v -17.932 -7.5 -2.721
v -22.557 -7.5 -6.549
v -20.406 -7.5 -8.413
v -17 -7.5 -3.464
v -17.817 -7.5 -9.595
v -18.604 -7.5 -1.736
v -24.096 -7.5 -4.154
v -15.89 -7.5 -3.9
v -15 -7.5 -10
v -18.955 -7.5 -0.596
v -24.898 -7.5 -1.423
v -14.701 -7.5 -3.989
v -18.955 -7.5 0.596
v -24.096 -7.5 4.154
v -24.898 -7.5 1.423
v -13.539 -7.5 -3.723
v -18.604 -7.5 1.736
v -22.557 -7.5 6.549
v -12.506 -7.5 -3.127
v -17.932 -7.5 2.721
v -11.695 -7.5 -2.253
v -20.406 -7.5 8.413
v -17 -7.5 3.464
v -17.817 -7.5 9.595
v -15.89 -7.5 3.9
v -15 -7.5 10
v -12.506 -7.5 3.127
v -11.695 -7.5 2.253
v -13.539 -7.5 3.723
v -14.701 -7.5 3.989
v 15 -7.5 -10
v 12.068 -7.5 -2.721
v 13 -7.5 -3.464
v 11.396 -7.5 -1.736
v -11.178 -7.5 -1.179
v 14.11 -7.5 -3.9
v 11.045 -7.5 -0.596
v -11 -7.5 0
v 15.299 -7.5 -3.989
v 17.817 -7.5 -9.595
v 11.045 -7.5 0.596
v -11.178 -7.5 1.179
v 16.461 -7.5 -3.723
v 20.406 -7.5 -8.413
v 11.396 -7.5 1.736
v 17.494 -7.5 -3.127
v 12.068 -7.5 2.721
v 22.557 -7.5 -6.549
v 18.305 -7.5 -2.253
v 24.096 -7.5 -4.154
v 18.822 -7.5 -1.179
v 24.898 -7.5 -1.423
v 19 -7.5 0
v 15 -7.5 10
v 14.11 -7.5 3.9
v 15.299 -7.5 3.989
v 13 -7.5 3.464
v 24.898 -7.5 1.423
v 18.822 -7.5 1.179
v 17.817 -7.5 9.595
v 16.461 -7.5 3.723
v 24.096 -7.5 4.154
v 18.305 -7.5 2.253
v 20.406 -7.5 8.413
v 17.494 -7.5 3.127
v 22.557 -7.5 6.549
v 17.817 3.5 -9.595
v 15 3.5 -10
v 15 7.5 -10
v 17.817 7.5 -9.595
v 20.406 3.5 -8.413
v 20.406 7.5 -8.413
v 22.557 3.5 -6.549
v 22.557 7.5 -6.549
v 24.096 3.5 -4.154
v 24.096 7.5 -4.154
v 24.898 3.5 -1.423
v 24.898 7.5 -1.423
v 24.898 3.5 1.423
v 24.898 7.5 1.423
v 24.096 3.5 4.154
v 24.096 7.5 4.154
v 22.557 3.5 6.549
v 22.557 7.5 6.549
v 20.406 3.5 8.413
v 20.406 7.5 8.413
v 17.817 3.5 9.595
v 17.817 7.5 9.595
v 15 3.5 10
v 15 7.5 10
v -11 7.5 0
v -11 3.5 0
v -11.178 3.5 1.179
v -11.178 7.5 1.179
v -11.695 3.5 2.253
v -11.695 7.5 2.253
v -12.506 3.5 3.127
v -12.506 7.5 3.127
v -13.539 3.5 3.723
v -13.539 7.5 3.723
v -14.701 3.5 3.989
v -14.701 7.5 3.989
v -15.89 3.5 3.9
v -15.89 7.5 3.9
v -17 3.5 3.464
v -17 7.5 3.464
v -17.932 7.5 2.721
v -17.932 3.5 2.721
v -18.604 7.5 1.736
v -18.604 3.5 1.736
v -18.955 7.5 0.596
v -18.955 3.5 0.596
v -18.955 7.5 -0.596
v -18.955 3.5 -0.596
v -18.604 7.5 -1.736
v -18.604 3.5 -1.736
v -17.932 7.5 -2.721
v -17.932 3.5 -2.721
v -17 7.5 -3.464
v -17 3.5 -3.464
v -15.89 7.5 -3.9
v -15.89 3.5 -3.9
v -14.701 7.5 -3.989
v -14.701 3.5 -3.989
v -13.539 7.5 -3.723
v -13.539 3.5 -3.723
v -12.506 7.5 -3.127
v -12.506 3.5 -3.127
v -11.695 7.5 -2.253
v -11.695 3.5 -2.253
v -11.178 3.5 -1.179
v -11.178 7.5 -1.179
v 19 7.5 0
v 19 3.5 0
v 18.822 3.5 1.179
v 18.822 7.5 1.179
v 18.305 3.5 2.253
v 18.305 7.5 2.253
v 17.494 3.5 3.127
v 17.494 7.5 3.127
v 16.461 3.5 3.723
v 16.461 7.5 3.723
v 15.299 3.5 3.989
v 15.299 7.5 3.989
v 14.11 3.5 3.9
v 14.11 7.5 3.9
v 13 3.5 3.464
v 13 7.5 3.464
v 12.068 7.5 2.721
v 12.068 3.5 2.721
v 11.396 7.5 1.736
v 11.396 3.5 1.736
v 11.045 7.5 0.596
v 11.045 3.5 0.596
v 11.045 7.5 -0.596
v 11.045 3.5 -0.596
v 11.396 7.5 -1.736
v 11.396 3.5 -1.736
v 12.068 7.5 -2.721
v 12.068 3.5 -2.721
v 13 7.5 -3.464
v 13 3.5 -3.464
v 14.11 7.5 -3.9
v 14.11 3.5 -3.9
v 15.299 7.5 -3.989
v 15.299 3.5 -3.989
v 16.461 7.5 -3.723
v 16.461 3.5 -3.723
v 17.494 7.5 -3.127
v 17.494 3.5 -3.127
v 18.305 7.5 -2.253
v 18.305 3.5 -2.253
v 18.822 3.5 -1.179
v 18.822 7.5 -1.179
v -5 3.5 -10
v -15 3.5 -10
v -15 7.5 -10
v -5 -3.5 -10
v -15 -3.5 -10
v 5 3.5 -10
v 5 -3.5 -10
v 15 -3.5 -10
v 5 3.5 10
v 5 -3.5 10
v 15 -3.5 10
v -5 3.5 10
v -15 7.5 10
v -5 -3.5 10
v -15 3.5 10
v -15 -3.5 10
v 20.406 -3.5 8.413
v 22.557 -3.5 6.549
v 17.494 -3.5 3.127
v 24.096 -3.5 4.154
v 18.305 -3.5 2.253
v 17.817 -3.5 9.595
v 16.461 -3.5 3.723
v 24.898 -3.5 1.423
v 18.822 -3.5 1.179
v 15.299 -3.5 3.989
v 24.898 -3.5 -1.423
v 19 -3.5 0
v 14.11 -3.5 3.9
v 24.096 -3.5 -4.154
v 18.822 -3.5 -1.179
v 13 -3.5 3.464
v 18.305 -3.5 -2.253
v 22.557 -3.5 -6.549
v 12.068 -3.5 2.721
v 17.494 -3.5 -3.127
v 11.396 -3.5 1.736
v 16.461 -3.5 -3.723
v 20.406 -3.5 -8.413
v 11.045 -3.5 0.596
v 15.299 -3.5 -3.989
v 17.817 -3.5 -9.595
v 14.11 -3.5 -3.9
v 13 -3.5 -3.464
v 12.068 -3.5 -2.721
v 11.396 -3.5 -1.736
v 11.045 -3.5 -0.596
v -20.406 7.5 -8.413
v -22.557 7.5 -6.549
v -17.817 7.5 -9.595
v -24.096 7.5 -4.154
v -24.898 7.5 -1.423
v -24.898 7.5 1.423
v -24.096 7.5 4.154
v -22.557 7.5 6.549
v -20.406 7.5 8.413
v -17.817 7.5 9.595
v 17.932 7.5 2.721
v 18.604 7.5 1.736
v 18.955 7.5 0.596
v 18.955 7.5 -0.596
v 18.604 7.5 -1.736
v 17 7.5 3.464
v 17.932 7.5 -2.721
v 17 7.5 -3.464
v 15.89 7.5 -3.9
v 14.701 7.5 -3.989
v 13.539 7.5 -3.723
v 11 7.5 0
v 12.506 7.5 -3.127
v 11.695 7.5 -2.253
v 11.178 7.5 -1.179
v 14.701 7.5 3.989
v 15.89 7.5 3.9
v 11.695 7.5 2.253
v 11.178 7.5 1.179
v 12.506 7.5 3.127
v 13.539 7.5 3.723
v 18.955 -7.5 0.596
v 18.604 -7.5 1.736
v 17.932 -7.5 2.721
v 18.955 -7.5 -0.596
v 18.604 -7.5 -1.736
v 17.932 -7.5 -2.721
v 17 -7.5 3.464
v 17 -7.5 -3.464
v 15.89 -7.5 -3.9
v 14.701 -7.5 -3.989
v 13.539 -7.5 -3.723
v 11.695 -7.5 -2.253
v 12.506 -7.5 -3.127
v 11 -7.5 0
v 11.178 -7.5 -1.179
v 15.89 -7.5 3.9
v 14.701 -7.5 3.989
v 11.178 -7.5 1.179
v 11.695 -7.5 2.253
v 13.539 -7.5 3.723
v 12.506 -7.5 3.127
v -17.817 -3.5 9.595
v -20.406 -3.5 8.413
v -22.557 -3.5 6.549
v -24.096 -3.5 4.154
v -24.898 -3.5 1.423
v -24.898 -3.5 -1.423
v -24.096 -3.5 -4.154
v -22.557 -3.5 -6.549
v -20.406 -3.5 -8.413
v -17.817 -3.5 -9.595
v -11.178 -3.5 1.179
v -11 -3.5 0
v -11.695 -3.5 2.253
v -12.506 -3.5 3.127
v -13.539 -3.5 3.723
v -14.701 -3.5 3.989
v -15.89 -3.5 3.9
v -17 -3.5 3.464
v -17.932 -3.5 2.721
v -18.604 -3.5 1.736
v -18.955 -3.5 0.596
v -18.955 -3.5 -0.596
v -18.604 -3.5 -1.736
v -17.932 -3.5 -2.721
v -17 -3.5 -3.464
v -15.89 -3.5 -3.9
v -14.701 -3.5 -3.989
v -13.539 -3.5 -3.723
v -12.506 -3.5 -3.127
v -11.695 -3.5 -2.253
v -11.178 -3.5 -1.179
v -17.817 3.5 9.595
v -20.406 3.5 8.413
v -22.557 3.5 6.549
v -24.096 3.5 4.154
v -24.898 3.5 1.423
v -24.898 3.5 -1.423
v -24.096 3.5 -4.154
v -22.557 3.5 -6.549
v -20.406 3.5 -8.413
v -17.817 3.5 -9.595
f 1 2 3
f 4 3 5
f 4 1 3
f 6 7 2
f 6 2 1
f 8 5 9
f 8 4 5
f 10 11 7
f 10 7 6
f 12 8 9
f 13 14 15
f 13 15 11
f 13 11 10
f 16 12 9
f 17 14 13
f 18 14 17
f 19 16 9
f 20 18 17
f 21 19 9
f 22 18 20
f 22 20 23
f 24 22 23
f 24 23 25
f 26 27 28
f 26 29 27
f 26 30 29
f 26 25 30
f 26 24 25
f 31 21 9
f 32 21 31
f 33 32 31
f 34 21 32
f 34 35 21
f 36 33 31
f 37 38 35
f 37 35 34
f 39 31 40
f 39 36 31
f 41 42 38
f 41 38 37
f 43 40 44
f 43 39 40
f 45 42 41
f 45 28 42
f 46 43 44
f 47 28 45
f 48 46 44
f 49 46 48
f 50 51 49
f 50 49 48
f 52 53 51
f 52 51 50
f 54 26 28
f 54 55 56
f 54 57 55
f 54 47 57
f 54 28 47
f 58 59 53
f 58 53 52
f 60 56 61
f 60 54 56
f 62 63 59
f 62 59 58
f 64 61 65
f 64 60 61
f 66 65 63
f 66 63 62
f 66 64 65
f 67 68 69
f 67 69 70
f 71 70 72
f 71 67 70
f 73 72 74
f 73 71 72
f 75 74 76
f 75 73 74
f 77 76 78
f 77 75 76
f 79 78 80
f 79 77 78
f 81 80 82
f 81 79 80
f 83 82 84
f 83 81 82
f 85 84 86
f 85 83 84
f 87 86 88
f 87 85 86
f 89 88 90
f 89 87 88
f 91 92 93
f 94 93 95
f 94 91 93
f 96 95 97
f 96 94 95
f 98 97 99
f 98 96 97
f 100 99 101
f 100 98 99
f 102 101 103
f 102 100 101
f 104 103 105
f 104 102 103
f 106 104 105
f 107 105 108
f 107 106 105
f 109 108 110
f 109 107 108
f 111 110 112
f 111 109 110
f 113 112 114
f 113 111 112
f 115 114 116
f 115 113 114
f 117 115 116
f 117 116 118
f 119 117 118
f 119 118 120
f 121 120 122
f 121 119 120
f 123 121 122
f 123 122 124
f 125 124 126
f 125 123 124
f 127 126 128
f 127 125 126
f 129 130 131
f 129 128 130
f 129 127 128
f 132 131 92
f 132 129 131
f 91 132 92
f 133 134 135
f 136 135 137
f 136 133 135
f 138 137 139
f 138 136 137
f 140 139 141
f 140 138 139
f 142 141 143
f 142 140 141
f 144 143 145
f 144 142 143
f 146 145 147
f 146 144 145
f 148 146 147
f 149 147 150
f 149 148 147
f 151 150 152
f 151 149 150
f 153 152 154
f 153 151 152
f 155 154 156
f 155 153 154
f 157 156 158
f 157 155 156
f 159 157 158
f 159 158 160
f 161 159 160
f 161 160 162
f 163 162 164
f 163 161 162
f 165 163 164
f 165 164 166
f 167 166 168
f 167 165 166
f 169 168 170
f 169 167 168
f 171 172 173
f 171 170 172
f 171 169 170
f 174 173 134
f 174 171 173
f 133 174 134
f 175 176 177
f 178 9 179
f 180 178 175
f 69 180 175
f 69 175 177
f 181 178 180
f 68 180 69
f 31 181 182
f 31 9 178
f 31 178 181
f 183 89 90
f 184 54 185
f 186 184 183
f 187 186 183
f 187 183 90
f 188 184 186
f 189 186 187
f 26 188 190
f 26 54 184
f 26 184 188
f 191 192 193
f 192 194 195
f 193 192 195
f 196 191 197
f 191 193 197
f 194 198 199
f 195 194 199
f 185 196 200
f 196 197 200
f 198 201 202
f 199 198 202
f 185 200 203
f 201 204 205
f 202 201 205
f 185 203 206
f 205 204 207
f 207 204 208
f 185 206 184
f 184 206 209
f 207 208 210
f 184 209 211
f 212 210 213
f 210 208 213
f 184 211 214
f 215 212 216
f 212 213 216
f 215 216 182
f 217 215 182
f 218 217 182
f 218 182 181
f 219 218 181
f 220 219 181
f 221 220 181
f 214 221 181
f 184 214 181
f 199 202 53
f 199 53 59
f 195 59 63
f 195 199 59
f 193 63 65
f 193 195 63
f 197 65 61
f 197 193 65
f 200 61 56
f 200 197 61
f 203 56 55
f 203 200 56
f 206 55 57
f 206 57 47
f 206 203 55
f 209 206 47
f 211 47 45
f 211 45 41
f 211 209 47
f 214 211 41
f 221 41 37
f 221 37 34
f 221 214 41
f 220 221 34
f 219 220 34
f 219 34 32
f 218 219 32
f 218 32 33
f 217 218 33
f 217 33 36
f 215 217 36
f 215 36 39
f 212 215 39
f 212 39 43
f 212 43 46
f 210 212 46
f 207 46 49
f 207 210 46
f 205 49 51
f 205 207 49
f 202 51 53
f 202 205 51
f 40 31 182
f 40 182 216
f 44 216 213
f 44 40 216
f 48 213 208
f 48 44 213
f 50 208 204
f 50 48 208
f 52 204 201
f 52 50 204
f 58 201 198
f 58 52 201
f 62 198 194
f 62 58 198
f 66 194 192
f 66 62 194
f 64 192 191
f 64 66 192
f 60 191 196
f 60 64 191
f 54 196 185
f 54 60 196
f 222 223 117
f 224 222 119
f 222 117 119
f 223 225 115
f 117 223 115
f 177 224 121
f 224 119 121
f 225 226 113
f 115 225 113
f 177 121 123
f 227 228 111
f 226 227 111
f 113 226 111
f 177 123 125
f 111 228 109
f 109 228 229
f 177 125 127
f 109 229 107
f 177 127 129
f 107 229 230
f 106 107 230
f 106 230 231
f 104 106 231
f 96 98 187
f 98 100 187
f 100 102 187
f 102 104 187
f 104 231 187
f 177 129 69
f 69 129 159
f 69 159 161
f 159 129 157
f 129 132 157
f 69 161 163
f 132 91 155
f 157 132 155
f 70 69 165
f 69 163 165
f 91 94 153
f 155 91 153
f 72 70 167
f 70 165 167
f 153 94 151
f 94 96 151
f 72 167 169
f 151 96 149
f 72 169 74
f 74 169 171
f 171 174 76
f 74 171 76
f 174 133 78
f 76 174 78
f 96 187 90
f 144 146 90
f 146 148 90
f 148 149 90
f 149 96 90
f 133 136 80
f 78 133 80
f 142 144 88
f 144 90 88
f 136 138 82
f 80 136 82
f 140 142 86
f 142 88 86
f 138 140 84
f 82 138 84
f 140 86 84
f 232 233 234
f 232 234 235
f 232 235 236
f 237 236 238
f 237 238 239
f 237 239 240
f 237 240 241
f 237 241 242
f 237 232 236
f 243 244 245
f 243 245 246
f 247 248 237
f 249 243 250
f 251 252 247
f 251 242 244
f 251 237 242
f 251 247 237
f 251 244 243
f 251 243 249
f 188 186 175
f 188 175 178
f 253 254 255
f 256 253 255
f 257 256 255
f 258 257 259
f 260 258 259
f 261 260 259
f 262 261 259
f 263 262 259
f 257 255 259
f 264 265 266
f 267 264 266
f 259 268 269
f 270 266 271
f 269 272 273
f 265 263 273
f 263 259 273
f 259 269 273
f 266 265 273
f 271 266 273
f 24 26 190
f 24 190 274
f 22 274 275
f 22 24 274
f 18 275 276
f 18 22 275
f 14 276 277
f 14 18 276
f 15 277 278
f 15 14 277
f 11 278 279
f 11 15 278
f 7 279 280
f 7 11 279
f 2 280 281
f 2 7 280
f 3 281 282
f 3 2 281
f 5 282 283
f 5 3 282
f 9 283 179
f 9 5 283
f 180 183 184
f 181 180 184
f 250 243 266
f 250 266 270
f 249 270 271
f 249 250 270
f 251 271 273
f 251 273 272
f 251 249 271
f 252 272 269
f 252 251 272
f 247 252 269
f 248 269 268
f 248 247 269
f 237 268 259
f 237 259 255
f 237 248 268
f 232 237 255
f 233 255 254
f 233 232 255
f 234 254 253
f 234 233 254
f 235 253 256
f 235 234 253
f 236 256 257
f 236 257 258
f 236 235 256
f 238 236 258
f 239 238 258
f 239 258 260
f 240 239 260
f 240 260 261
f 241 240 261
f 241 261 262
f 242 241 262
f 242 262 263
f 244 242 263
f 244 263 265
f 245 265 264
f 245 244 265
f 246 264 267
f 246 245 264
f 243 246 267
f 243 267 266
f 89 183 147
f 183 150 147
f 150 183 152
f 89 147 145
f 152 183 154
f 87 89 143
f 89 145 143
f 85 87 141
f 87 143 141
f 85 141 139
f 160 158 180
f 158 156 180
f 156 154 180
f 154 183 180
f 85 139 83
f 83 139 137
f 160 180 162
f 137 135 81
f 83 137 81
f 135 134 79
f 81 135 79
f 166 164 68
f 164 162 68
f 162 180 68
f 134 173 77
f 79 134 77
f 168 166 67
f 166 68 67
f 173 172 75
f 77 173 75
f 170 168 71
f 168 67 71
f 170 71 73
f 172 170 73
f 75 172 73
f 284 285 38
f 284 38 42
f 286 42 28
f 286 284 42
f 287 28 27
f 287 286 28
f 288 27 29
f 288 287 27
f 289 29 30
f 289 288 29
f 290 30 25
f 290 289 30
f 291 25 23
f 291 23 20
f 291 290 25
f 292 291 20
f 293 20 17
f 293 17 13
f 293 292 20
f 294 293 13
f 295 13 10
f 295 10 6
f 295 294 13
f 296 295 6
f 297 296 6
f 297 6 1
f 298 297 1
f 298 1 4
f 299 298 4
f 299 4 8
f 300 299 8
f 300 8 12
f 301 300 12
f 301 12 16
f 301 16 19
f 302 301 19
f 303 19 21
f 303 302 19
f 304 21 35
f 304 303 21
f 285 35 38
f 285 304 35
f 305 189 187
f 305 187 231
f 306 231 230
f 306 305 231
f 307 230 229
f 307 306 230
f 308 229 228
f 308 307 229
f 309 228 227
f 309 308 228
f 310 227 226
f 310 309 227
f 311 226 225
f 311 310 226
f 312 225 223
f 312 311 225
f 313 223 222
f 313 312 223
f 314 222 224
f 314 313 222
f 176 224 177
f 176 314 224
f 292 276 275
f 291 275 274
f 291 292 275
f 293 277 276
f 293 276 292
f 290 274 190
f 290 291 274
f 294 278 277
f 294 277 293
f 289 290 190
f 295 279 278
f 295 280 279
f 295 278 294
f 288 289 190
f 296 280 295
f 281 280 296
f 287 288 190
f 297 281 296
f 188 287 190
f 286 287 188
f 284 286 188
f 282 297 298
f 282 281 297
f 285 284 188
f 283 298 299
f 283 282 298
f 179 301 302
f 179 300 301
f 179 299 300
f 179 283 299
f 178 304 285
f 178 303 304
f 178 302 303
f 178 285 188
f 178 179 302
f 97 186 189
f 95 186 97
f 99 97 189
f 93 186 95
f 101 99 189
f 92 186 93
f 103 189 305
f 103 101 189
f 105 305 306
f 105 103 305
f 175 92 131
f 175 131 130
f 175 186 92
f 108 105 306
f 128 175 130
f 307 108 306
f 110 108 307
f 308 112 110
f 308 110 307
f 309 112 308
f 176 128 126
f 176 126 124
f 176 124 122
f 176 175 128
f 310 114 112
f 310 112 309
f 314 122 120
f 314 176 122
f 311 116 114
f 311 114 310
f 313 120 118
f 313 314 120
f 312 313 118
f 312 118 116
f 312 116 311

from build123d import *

# Parameters (mm, degrees)
F0_R     = 4
F1_DEPTH = 7.5
F2_W     = 13.542375192
F2_H     = 7
F2_W_2   = 10
F3_DEPTH = 20.001
F4_R     = 4
F5_DEPTH = 15


# Not quite as in the source:
# - a pattern or mirror of a feature is missing from the dataset's text; its kind, count and spacing are read off the source's solid


with BuildPart() as f1:
    # F0 (on Front) → F1 (new body, symmetric)
    with BuildSketch(Plane.XZ):
        with BuildLine():
            Line((15, 10), (-15, 10))
            ThreePointArc((-15, 10), (-25, 0), (-15, -10))
            Line((-15, -10), (15, -10))
            ThreePointArc((15, -10), (25, 0), (15, 10))
        make_face()
        with Locations((-15, 0)):
            Circle(F0_R, mode=Mode.SUBTRACT)
        with Locations((15, 0)):
            Circle(F0_R, mode=Mode.SUBTRACT)
    extrude(amount=F1_DEPTH, both=True)

    # F2 (on face) → F3 (cut, through all)
    with BuildSketch(Plane(origin=(0, 0, -10), x_dir=(1, 0, 0), z_dir=(0, 0, -1))):
        with Locations((21.771187596, 0)):
            Rectangle(F2_W, F2_H)
        with Locations((10, 0)):
            Rectangle(F2_W_2, F2_H)
    f3 = extrude(amount=-F3_DEPTH, mode=Mode.SUBTRACT)

    # F3_copies: F3 across plane
    add(f3.mirror(Plane(origin=(0, 0, 0), x_dir=(0, 0, -1), z_dir=(-1, 0, 0))), mode=Mode.SUBTRACT)


with BuildPart() as f5:
    # F4 (on face) → F5 (new body)
    with BuildSketch(Plane(origin=(0, 7.5, 0), x_dir=(-1, 0, 0), z_dir=(0, 1, 0))):
        with Locations((-15, 0)):
            Circle(F4_R)
    extrude(amount=-F5_DEPTH)


with BuildPart() as f5b:
    # F4 (on face) → F5, piece 2 (new body)
    with BuildSketch(Plane(origin=(0, 7.5, 0), x_dir=(-1, 0, 0), z_dir=(0, 1, 0))):
        with Locations((15, 0)):
            Circle(F4_R)
    extrude(amount=-F5_DEPTH)


solid = Compound([f1.part, f5.part])
